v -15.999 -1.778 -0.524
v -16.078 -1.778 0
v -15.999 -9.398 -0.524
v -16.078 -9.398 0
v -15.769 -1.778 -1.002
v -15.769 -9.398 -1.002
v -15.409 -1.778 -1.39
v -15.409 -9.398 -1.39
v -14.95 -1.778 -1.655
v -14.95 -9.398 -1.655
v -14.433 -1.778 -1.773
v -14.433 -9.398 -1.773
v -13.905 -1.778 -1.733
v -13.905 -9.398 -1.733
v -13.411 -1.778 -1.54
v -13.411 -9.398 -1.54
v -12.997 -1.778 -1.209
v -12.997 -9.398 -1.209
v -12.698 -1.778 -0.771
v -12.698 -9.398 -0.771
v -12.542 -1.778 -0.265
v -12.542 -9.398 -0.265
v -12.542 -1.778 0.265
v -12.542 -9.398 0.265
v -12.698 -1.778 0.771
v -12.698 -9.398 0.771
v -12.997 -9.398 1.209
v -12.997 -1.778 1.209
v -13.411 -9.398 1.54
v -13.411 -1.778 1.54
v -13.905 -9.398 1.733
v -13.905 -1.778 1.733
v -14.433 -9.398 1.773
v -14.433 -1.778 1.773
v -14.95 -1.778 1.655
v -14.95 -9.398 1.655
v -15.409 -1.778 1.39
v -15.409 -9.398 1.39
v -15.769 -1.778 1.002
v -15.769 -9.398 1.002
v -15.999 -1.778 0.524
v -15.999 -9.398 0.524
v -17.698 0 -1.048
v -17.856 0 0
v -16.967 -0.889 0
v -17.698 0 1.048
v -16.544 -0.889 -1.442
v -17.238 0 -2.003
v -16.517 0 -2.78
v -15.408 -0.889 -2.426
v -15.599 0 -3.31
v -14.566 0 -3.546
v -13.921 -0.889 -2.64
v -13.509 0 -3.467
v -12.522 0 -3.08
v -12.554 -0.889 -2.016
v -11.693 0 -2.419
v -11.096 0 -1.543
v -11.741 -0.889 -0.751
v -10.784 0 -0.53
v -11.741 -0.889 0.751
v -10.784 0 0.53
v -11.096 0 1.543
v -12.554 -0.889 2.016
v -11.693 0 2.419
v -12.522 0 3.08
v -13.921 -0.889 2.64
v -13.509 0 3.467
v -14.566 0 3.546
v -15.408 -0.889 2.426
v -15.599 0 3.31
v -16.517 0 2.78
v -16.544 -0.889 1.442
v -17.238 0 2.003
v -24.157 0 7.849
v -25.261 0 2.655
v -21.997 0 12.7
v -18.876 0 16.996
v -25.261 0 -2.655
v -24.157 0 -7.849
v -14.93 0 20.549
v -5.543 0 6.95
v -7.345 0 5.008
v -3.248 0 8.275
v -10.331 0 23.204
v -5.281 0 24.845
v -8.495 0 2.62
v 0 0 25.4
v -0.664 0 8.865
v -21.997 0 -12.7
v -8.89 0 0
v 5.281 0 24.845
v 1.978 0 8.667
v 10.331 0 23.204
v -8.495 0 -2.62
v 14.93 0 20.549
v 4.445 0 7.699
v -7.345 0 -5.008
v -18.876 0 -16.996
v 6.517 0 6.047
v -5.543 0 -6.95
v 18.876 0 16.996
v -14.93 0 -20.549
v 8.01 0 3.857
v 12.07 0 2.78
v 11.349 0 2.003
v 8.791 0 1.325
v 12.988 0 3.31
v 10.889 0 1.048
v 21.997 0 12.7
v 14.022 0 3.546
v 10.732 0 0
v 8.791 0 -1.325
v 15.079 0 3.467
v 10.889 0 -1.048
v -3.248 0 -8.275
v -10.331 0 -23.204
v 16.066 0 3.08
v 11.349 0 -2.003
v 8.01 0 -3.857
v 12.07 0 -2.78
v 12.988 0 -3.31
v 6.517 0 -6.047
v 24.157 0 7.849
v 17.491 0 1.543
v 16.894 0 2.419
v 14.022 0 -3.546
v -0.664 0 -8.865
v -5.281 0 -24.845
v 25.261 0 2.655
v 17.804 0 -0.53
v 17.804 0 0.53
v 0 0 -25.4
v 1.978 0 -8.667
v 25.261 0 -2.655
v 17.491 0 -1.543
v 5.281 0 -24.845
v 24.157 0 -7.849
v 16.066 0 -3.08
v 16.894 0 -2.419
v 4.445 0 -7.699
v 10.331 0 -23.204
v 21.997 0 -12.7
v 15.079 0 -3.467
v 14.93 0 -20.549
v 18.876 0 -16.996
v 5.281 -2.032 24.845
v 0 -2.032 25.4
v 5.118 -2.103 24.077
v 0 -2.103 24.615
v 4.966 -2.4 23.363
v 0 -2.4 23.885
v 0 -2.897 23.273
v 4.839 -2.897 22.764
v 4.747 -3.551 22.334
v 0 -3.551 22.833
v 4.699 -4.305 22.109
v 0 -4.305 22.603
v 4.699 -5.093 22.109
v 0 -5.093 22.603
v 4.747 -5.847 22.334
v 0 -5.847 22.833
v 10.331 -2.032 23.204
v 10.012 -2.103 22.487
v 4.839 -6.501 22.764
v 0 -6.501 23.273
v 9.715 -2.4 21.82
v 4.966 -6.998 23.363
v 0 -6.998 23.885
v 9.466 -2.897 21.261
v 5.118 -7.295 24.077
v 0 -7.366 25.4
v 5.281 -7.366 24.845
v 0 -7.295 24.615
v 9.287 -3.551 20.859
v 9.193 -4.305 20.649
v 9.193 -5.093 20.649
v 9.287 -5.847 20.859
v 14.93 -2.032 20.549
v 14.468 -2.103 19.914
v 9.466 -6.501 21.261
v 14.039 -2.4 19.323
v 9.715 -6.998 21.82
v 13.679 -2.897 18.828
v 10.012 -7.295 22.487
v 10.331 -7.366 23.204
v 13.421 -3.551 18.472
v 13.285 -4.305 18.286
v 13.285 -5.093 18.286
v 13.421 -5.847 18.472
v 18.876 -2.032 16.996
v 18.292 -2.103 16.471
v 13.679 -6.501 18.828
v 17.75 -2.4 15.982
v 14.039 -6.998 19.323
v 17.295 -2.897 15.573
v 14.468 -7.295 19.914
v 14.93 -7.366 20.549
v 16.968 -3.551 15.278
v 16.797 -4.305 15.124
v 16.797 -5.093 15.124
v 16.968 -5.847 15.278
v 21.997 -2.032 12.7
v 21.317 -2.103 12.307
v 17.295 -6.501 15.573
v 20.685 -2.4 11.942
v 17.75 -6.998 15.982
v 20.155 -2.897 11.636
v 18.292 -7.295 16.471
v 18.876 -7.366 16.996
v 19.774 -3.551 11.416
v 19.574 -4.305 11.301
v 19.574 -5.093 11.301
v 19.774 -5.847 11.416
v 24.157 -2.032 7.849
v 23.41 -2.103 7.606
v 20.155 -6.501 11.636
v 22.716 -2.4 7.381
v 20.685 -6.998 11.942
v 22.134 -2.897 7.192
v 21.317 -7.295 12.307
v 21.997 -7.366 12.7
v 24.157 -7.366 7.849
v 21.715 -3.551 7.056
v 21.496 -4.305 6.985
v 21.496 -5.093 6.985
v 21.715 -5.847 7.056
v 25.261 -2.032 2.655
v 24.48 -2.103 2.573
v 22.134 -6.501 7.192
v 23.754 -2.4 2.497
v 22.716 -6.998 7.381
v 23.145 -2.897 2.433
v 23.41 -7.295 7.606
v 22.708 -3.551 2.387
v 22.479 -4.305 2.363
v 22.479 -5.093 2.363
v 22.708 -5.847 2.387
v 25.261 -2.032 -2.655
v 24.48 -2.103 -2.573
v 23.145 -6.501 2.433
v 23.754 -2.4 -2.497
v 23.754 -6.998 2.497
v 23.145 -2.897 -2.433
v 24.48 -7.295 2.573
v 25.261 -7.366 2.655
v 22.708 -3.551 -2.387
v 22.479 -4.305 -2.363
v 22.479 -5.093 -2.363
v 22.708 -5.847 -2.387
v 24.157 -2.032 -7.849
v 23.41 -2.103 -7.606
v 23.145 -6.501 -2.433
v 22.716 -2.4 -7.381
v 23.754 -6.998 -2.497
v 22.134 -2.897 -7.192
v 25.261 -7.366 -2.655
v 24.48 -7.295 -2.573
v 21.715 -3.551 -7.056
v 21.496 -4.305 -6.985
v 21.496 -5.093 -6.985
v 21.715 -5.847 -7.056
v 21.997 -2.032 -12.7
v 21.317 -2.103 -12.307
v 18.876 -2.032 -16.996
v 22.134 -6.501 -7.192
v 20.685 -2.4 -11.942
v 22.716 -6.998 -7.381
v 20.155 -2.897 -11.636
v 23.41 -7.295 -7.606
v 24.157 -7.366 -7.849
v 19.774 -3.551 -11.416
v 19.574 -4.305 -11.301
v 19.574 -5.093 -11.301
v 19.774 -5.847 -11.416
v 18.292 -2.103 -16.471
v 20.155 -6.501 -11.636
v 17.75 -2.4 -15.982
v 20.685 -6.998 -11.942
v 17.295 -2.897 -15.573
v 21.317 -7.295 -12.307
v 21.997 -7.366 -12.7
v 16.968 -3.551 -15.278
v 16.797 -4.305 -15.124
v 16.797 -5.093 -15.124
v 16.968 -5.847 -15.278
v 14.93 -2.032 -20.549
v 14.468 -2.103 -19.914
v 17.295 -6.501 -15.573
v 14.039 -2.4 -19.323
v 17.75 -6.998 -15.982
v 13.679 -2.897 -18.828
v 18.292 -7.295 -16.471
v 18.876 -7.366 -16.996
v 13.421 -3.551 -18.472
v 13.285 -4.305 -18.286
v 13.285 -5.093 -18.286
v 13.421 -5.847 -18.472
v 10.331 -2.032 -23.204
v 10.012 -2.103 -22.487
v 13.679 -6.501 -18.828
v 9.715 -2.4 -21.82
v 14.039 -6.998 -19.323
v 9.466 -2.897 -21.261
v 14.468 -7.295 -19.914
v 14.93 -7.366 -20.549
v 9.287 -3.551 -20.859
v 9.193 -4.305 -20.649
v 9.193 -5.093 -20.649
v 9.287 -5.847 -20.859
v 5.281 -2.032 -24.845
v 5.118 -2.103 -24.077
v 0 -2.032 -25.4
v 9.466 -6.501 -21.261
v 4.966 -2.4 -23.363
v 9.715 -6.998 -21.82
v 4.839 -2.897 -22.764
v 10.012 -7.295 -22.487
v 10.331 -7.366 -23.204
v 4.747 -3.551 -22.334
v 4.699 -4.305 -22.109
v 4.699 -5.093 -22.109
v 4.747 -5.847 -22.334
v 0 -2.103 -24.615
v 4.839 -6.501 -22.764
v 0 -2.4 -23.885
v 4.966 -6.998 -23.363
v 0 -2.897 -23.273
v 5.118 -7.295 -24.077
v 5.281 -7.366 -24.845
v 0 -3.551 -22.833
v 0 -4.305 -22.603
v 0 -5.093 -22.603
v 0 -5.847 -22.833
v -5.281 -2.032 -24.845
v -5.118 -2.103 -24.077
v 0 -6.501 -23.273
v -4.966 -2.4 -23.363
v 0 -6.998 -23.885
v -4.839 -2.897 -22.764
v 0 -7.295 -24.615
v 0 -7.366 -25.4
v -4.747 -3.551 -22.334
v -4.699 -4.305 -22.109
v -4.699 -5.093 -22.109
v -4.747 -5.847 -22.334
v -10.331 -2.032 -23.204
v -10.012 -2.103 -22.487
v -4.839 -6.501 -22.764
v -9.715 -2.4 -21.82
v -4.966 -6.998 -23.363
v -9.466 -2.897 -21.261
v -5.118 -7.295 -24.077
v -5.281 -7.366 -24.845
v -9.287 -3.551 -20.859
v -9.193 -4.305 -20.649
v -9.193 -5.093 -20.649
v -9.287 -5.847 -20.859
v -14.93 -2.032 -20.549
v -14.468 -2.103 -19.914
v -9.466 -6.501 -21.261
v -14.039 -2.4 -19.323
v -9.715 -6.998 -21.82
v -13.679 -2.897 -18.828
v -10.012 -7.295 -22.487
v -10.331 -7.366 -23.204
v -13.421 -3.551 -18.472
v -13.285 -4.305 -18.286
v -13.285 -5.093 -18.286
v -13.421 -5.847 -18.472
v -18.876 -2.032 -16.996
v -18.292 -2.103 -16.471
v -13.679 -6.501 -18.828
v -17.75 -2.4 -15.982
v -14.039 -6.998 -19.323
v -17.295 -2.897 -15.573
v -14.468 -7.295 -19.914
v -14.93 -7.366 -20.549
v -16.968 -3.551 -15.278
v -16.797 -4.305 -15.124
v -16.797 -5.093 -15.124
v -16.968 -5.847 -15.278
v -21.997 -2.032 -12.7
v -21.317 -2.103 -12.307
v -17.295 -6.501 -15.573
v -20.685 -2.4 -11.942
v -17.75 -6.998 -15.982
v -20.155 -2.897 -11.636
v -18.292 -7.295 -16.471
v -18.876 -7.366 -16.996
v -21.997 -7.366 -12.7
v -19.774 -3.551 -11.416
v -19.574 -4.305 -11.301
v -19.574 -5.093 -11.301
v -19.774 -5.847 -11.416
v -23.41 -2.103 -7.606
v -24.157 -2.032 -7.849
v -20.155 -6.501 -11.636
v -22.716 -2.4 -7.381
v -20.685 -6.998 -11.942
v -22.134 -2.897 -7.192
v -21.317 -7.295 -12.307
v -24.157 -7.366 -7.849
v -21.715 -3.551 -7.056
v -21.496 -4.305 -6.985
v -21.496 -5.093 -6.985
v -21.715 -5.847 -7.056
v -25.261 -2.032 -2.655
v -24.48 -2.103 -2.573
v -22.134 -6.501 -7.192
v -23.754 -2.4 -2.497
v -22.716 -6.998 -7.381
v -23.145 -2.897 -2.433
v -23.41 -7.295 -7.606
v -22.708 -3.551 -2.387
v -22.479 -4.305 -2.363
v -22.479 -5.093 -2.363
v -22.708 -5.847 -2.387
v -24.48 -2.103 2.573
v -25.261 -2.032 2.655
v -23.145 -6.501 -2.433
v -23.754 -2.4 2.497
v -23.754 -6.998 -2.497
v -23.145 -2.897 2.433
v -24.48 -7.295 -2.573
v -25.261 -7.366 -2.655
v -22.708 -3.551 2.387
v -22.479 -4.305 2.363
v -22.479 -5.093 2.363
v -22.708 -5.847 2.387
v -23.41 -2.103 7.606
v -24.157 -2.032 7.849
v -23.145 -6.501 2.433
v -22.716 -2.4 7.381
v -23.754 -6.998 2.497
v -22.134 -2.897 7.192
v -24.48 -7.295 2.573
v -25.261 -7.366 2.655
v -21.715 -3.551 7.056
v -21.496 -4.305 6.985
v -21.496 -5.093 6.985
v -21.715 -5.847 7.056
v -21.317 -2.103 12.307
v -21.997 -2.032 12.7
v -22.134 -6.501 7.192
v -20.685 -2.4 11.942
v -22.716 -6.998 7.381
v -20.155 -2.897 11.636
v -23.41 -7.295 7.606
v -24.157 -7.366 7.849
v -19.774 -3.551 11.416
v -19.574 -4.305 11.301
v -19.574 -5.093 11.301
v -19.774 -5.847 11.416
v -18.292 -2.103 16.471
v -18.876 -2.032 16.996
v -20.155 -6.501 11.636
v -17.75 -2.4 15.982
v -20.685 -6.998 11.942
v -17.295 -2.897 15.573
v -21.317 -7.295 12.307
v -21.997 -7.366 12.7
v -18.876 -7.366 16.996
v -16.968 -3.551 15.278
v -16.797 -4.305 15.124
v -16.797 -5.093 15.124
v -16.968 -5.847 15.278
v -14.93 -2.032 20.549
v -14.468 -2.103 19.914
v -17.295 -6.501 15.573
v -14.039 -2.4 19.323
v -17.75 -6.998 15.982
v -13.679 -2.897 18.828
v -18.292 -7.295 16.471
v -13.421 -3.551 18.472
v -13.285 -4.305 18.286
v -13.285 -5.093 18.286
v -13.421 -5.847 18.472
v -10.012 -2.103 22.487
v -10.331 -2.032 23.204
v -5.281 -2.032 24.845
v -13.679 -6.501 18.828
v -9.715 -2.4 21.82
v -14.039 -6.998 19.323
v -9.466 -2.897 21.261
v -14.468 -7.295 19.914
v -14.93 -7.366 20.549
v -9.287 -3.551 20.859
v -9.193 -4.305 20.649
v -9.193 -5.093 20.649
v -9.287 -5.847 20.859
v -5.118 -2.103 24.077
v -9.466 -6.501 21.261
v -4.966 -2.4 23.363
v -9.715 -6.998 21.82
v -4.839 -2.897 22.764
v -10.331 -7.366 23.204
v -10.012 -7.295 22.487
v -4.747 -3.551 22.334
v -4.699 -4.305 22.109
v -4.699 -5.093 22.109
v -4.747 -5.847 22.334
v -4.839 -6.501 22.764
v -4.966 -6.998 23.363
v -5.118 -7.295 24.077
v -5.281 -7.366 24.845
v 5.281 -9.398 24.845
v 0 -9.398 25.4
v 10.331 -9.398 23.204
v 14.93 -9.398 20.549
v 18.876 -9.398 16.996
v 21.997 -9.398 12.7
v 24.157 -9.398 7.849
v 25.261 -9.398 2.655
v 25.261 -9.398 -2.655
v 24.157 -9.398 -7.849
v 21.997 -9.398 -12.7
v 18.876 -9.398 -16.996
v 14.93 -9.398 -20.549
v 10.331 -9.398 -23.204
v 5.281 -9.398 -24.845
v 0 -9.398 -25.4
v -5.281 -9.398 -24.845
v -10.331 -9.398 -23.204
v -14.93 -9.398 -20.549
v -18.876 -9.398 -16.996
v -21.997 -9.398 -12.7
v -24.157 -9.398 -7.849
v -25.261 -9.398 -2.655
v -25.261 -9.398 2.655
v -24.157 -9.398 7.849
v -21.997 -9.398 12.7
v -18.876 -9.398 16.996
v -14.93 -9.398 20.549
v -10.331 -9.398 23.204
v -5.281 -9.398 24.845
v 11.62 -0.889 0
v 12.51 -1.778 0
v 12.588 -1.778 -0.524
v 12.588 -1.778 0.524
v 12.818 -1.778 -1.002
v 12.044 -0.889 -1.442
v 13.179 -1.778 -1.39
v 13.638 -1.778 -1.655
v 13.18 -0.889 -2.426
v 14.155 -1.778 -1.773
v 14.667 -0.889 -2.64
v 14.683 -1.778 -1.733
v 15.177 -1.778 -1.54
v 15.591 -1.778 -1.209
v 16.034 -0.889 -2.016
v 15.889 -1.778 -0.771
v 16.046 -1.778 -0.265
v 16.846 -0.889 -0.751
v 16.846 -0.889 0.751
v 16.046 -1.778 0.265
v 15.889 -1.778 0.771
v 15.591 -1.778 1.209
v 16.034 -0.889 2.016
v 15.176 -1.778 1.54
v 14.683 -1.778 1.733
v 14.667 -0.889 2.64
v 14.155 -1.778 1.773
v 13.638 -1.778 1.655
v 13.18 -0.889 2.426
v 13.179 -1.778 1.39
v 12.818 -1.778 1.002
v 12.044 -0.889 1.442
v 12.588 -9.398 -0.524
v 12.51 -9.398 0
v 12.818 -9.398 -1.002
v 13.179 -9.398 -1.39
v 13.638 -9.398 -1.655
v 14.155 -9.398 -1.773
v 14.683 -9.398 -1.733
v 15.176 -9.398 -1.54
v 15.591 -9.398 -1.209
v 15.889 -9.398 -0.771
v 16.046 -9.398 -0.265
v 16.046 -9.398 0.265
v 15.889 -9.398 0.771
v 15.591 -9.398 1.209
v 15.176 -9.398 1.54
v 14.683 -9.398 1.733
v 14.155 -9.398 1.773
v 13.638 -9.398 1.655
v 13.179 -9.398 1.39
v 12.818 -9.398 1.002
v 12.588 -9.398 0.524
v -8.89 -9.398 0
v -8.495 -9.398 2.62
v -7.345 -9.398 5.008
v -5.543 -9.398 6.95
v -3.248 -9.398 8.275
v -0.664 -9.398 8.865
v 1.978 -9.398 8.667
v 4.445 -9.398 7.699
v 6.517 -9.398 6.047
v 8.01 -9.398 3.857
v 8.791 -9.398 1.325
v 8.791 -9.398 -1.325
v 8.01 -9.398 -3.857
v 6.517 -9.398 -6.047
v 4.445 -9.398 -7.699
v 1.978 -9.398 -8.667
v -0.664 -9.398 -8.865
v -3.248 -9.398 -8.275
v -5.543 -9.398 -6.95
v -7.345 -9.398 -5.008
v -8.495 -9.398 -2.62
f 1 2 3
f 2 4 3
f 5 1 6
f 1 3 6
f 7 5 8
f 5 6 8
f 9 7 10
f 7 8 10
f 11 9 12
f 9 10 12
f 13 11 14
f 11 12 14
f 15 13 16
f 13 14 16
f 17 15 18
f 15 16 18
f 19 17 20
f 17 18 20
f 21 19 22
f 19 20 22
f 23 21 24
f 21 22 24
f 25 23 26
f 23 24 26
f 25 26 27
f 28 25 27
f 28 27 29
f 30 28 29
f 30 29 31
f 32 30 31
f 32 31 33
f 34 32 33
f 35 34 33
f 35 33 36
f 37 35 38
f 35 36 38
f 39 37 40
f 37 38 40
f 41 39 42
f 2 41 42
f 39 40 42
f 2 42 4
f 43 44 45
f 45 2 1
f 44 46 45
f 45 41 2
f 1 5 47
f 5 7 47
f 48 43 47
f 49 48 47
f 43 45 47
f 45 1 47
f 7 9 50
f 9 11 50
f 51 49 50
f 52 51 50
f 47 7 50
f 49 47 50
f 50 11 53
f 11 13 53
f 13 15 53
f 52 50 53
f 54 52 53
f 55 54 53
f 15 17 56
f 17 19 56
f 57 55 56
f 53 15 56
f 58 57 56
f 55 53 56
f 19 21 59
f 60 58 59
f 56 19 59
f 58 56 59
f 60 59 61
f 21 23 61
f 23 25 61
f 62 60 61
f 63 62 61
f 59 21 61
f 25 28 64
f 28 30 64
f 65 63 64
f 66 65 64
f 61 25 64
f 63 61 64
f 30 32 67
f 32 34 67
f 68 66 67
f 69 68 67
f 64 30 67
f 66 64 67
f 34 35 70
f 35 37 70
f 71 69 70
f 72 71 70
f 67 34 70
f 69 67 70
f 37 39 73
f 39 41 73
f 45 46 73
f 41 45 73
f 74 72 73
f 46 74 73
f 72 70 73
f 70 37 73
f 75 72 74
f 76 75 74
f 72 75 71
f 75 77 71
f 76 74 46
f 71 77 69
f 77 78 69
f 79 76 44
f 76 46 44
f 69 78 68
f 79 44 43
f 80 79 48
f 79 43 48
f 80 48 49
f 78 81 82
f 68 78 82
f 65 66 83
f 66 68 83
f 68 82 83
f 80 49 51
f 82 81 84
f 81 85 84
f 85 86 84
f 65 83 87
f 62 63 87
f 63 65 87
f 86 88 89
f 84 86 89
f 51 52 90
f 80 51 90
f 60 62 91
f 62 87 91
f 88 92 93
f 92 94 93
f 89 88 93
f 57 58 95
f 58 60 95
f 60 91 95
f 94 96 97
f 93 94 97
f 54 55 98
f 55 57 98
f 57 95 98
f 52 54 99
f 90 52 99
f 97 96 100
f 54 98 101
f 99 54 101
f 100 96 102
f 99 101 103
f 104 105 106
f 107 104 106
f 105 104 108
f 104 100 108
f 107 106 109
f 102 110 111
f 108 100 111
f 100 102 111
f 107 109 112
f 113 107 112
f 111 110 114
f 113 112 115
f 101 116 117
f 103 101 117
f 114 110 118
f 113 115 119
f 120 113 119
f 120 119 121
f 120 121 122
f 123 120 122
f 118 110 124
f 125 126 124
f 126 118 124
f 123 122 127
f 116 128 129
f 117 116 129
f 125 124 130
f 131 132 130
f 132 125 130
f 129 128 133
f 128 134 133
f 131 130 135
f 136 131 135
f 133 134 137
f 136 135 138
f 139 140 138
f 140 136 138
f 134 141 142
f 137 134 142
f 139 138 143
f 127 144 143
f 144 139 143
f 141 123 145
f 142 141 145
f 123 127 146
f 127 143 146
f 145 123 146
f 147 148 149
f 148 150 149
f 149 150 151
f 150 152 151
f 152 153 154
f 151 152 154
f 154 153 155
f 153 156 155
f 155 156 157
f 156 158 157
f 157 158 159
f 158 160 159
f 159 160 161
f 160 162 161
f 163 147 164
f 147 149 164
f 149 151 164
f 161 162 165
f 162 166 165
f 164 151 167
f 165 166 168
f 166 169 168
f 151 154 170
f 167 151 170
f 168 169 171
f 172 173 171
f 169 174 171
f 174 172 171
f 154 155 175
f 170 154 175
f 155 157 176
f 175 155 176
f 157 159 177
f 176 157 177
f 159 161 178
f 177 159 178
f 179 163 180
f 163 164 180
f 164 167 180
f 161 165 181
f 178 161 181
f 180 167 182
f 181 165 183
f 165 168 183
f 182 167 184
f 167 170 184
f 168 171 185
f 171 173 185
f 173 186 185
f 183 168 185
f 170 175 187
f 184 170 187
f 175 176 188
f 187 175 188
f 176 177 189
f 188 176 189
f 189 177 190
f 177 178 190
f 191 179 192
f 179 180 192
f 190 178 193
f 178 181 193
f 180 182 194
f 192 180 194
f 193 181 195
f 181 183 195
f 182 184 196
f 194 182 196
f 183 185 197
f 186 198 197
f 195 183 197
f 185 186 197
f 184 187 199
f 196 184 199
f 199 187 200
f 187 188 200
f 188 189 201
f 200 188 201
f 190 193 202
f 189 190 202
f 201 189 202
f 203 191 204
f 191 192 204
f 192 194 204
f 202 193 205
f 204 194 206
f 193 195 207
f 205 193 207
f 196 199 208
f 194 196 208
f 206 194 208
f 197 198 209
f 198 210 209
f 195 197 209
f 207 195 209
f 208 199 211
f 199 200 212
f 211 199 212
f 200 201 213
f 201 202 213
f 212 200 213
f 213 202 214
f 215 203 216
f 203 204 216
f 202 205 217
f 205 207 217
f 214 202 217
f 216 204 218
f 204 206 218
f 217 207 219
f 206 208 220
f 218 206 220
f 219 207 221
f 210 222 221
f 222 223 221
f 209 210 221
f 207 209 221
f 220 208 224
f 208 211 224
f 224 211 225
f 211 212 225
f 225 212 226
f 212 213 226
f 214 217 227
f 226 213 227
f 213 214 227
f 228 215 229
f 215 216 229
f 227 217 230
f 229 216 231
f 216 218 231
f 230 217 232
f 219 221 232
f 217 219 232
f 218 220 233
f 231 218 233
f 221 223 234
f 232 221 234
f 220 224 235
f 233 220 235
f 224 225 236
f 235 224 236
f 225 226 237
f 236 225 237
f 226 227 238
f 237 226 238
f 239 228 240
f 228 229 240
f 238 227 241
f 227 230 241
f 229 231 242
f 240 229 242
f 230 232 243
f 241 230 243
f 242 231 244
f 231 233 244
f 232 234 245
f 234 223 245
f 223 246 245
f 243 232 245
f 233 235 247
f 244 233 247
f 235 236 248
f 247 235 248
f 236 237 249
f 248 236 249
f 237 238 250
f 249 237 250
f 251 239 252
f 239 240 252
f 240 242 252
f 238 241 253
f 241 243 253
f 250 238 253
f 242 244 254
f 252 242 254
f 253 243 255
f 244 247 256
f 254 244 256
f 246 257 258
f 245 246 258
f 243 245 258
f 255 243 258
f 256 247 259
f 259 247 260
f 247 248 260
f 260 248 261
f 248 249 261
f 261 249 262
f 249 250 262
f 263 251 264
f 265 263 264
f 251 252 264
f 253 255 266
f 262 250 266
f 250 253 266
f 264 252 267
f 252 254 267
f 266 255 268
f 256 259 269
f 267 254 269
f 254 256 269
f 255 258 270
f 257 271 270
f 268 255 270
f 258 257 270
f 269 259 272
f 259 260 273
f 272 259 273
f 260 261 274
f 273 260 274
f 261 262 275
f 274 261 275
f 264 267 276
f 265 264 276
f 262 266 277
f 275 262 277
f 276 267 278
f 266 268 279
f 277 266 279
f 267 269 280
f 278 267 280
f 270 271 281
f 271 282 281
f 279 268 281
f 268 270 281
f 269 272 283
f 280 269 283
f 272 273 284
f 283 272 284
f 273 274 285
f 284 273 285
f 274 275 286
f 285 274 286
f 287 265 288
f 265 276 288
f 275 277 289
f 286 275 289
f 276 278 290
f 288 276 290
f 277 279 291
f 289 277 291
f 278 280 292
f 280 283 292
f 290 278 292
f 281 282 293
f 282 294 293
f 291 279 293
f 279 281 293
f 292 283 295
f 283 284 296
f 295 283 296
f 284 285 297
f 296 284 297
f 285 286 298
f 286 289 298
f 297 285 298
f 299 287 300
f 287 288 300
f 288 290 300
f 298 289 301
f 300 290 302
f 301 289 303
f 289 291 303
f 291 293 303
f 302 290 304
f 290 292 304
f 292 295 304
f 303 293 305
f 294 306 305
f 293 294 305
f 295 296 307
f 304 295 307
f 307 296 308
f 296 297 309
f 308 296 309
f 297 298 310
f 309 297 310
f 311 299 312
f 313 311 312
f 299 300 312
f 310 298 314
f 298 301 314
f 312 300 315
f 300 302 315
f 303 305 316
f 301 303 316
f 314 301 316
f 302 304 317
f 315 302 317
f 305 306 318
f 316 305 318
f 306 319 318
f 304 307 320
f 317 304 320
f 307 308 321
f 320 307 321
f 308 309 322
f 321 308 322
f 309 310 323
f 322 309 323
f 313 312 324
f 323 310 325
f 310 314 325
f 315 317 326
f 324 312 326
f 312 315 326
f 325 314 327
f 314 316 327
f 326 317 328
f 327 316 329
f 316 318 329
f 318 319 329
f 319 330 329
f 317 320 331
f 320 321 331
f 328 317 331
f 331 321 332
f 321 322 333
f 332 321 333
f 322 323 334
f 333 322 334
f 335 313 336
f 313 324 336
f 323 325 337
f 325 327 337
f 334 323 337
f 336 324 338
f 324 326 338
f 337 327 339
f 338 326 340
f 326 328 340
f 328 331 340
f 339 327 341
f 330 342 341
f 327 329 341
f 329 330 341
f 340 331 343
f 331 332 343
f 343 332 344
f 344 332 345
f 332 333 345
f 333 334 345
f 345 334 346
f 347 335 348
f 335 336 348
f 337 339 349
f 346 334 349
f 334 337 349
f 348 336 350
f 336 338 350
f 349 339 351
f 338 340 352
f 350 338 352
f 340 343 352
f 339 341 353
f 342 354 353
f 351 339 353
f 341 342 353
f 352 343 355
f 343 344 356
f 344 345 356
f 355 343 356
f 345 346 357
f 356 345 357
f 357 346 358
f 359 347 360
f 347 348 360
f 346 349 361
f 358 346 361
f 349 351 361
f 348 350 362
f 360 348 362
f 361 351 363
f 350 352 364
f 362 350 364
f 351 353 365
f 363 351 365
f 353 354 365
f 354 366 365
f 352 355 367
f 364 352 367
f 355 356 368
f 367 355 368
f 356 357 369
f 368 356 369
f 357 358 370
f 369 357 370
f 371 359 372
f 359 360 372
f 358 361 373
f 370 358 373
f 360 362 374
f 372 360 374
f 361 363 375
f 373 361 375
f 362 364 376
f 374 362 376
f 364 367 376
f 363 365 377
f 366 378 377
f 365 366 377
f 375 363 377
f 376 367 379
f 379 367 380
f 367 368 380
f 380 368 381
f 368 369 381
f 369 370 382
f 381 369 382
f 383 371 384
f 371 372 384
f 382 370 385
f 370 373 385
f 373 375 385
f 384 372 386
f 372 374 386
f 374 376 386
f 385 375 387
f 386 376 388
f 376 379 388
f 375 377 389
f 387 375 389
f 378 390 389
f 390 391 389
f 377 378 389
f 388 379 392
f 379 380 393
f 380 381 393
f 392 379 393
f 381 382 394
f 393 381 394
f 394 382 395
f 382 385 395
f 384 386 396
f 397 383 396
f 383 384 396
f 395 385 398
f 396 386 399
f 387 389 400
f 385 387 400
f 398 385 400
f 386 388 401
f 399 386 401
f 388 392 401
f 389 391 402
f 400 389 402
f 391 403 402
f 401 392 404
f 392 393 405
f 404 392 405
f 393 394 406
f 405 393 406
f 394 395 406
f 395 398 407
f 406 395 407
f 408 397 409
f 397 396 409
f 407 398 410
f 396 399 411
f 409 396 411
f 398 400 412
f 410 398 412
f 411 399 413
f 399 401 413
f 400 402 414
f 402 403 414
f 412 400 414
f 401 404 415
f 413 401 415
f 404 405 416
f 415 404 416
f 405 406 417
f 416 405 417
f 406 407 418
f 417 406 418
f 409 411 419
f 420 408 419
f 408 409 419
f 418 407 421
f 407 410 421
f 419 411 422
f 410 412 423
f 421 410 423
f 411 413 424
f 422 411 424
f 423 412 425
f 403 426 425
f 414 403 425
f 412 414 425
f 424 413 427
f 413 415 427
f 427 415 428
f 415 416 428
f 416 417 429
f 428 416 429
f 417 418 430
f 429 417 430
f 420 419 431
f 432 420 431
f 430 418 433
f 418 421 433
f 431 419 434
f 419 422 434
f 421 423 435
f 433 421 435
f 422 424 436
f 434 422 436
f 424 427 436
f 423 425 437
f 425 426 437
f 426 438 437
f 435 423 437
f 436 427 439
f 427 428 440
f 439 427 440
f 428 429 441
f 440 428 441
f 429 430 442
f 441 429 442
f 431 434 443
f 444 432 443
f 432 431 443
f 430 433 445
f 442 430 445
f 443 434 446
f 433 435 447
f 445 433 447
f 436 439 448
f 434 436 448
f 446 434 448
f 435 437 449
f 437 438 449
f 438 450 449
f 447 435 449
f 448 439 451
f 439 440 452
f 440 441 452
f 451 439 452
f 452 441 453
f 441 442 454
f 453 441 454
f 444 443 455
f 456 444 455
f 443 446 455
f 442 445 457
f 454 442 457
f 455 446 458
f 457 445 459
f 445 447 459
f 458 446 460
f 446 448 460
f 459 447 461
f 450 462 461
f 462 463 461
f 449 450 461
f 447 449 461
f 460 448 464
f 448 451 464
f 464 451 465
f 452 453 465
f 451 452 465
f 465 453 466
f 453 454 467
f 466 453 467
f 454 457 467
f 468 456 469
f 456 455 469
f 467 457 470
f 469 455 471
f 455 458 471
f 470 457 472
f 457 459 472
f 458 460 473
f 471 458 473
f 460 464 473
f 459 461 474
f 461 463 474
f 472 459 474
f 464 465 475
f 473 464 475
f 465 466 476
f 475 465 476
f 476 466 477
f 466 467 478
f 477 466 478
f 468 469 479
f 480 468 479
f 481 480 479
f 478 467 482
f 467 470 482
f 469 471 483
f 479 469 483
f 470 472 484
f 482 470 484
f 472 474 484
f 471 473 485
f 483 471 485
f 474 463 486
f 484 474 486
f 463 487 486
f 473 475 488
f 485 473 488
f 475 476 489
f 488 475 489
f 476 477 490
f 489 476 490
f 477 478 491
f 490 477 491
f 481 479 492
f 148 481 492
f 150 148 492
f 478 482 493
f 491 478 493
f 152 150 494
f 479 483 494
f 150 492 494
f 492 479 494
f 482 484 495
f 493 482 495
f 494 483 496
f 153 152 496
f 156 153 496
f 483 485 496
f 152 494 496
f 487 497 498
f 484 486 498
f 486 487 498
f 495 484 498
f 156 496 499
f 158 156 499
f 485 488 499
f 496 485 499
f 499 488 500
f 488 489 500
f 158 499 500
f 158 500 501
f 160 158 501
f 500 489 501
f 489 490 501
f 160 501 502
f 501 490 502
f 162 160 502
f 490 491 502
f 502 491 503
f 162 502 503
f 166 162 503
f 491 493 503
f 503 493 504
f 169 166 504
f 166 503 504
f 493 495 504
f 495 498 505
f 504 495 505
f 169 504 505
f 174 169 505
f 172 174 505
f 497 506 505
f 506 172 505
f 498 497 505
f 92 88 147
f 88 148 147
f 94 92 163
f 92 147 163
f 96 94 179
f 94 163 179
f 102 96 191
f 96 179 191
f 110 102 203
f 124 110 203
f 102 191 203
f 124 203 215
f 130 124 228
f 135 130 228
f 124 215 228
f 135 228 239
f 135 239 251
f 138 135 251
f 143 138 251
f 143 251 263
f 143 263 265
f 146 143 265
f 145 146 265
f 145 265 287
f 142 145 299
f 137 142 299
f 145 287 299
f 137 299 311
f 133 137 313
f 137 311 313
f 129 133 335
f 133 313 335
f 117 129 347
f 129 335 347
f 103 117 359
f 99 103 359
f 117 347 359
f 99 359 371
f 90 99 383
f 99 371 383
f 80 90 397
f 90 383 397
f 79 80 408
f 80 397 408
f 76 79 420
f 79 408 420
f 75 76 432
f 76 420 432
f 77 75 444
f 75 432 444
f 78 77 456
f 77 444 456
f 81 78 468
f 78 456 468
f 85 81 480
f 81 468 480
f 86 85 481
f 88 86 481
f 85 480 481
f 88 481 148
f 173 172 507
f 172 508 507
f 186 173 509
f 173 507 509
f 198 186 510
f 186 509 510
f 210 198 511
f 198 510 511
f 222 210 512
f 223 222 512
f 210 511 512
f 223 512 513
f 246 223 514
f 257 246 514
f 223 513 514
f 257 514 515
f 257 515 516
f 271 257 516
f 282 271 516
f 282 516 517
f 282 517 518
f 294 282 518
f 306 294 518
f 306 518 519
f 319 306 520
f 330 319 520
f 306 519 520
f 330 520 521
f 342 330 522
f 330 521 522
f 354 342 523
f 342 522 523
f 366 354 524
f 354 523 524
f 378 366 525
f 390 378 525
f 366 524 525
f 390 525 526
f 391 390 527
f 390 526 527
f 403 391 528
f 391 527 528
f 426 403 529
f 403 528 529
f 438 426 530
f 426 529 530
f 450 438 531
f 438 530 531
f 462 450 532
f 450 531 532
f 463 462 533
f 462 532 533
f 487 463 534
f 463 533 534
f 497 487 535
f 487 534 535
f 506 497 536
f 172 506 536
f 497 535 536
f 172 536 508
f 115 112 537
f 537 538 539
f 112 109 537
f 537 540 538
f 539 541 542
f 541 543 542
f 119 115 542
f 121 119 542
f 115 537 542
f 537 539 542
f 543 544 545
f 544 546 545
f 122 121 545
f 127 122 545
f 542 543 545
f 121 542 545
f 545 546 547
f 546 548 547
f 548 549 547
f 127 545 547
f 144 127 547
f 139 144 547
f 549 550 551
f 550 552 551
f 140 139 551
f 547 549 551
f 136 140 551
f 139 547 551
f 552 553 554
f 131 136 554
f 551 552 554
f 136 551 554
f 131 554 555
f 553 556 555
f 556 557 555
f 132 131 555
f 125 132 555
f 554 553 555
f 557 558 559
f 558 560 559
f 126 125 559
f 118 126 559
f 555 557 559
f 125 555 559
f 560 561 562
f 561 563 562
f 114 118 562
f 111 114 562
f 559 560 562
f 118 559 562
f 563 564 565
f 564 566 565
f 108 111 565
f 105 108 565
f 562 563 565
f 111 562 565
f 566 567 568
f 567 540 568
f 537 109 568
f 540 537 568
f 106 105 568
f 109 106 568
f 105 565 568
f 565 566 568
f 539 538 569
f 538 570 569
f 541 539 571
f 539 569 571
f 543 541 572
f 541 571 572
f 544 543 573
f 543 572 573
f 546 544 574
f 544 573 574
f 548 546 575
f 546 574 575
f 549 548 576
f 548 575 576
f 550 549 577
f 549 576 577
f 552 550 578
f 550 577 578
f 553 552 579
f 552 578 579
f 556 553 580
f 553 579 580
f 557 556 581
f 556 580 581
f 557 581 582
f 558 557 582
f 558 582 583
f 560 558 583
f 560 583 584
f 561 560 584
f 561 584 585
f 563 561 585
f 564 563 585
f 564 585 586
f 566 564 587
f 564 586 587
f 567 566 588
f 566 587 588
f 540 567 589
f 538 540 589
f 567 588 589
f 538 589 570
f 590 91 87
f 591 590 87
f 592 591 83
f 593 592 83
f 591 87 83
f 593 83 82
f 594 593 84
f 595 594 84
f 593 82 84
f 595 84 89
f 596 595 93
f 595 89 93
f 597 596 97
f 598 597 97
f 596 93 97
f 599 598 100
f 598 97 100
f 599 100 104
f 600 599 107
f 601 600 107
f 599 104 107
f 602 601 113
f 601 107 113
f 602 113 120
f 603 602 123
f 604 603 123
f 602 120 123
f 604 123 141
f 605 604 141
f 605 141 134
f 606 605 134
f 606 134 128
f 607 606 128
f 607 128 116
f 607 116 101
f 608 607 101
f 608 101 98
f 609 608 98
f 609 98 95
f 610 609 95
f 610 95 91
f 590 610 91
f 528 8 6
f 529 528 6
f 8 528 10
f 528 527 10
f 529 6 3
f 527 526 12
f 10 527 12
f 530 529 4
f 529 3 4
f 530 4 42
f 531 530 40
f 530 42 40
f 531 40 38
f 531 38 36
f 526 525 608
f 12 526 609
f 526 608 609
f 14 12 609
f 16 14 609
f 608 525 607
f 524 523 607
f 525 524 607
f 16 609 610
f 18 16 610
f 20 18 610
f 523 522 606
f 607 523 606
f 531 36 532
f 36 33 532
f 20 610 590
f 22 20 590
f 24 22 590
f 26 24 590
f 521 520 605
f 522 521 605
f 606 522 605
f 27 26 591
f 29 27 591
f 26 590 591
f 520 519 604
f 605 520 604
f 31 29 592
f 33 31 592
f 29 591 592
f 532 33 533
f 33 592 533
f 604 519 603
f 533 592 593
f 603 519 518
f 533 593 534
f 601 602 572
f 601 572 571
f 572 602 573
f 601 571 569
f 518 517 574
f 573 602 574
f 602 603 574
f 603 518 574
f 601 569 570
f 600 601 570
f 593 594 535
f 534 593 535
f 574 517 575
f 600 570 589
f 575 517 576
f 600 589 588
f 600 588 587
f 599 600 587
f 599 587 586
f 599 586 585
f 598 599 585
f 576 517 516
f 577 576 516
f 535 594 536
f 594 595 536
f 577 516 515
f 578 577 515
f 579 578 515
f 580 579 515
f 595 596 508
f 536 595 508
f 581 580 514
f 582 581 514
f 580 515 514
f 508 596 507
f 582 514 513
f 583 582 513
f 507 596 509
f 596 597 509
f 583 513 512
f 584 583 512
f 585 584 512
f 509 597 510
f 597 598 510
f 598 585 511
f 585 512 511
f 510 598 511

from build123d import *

# Parameters (mm, degrees)
F3_D           = 3.556
F3_CSINK_D     = 7.112
F3_CSINK_ANGLE = 90
F5_D           = 17.78


with BuildPart() as f1:
    # F0 (on Right) → F1 (revolve)
    with BuildSketch(Plane.YZ):
        with BuildLine():
            ThreePointArc((-2.032, 25.4), (-4.699, 22.57337), (-7.366, 25.4))
            Line((-7.366, 25.4), (-9.398, 25.4))
            Line((-9.398, 25.4), (-9.398, 0))
            Line((-9.398, 0), (0, 0))
            Line((0, 0), (0, 25.4))
            Line((0, 25.4), (-2.032, 25.4))
        make_face()
    revolve(axis=Axis((0, -4.699, 0), (0, 1, 0)))

    # F3 (through all)
    with Locations(Plane(origin=(0, 0, 0), x_dir=(1, 0, 0), z_dir=(0, 1, 0))):
        with Locations((14.2875, 0), (-14.3002, 0)):
            CounterSinkHole(F3_D / 2, F3_CSINK_D / 2, counter_sink_angle=F3_CSINK_ANGLE)

    # F5 (through all)
    with Locations(Plane.XZ.offset(9.398)):
        with Locations((0, 0)):
            Hole(F5_D / 2)


solid = f1.part
